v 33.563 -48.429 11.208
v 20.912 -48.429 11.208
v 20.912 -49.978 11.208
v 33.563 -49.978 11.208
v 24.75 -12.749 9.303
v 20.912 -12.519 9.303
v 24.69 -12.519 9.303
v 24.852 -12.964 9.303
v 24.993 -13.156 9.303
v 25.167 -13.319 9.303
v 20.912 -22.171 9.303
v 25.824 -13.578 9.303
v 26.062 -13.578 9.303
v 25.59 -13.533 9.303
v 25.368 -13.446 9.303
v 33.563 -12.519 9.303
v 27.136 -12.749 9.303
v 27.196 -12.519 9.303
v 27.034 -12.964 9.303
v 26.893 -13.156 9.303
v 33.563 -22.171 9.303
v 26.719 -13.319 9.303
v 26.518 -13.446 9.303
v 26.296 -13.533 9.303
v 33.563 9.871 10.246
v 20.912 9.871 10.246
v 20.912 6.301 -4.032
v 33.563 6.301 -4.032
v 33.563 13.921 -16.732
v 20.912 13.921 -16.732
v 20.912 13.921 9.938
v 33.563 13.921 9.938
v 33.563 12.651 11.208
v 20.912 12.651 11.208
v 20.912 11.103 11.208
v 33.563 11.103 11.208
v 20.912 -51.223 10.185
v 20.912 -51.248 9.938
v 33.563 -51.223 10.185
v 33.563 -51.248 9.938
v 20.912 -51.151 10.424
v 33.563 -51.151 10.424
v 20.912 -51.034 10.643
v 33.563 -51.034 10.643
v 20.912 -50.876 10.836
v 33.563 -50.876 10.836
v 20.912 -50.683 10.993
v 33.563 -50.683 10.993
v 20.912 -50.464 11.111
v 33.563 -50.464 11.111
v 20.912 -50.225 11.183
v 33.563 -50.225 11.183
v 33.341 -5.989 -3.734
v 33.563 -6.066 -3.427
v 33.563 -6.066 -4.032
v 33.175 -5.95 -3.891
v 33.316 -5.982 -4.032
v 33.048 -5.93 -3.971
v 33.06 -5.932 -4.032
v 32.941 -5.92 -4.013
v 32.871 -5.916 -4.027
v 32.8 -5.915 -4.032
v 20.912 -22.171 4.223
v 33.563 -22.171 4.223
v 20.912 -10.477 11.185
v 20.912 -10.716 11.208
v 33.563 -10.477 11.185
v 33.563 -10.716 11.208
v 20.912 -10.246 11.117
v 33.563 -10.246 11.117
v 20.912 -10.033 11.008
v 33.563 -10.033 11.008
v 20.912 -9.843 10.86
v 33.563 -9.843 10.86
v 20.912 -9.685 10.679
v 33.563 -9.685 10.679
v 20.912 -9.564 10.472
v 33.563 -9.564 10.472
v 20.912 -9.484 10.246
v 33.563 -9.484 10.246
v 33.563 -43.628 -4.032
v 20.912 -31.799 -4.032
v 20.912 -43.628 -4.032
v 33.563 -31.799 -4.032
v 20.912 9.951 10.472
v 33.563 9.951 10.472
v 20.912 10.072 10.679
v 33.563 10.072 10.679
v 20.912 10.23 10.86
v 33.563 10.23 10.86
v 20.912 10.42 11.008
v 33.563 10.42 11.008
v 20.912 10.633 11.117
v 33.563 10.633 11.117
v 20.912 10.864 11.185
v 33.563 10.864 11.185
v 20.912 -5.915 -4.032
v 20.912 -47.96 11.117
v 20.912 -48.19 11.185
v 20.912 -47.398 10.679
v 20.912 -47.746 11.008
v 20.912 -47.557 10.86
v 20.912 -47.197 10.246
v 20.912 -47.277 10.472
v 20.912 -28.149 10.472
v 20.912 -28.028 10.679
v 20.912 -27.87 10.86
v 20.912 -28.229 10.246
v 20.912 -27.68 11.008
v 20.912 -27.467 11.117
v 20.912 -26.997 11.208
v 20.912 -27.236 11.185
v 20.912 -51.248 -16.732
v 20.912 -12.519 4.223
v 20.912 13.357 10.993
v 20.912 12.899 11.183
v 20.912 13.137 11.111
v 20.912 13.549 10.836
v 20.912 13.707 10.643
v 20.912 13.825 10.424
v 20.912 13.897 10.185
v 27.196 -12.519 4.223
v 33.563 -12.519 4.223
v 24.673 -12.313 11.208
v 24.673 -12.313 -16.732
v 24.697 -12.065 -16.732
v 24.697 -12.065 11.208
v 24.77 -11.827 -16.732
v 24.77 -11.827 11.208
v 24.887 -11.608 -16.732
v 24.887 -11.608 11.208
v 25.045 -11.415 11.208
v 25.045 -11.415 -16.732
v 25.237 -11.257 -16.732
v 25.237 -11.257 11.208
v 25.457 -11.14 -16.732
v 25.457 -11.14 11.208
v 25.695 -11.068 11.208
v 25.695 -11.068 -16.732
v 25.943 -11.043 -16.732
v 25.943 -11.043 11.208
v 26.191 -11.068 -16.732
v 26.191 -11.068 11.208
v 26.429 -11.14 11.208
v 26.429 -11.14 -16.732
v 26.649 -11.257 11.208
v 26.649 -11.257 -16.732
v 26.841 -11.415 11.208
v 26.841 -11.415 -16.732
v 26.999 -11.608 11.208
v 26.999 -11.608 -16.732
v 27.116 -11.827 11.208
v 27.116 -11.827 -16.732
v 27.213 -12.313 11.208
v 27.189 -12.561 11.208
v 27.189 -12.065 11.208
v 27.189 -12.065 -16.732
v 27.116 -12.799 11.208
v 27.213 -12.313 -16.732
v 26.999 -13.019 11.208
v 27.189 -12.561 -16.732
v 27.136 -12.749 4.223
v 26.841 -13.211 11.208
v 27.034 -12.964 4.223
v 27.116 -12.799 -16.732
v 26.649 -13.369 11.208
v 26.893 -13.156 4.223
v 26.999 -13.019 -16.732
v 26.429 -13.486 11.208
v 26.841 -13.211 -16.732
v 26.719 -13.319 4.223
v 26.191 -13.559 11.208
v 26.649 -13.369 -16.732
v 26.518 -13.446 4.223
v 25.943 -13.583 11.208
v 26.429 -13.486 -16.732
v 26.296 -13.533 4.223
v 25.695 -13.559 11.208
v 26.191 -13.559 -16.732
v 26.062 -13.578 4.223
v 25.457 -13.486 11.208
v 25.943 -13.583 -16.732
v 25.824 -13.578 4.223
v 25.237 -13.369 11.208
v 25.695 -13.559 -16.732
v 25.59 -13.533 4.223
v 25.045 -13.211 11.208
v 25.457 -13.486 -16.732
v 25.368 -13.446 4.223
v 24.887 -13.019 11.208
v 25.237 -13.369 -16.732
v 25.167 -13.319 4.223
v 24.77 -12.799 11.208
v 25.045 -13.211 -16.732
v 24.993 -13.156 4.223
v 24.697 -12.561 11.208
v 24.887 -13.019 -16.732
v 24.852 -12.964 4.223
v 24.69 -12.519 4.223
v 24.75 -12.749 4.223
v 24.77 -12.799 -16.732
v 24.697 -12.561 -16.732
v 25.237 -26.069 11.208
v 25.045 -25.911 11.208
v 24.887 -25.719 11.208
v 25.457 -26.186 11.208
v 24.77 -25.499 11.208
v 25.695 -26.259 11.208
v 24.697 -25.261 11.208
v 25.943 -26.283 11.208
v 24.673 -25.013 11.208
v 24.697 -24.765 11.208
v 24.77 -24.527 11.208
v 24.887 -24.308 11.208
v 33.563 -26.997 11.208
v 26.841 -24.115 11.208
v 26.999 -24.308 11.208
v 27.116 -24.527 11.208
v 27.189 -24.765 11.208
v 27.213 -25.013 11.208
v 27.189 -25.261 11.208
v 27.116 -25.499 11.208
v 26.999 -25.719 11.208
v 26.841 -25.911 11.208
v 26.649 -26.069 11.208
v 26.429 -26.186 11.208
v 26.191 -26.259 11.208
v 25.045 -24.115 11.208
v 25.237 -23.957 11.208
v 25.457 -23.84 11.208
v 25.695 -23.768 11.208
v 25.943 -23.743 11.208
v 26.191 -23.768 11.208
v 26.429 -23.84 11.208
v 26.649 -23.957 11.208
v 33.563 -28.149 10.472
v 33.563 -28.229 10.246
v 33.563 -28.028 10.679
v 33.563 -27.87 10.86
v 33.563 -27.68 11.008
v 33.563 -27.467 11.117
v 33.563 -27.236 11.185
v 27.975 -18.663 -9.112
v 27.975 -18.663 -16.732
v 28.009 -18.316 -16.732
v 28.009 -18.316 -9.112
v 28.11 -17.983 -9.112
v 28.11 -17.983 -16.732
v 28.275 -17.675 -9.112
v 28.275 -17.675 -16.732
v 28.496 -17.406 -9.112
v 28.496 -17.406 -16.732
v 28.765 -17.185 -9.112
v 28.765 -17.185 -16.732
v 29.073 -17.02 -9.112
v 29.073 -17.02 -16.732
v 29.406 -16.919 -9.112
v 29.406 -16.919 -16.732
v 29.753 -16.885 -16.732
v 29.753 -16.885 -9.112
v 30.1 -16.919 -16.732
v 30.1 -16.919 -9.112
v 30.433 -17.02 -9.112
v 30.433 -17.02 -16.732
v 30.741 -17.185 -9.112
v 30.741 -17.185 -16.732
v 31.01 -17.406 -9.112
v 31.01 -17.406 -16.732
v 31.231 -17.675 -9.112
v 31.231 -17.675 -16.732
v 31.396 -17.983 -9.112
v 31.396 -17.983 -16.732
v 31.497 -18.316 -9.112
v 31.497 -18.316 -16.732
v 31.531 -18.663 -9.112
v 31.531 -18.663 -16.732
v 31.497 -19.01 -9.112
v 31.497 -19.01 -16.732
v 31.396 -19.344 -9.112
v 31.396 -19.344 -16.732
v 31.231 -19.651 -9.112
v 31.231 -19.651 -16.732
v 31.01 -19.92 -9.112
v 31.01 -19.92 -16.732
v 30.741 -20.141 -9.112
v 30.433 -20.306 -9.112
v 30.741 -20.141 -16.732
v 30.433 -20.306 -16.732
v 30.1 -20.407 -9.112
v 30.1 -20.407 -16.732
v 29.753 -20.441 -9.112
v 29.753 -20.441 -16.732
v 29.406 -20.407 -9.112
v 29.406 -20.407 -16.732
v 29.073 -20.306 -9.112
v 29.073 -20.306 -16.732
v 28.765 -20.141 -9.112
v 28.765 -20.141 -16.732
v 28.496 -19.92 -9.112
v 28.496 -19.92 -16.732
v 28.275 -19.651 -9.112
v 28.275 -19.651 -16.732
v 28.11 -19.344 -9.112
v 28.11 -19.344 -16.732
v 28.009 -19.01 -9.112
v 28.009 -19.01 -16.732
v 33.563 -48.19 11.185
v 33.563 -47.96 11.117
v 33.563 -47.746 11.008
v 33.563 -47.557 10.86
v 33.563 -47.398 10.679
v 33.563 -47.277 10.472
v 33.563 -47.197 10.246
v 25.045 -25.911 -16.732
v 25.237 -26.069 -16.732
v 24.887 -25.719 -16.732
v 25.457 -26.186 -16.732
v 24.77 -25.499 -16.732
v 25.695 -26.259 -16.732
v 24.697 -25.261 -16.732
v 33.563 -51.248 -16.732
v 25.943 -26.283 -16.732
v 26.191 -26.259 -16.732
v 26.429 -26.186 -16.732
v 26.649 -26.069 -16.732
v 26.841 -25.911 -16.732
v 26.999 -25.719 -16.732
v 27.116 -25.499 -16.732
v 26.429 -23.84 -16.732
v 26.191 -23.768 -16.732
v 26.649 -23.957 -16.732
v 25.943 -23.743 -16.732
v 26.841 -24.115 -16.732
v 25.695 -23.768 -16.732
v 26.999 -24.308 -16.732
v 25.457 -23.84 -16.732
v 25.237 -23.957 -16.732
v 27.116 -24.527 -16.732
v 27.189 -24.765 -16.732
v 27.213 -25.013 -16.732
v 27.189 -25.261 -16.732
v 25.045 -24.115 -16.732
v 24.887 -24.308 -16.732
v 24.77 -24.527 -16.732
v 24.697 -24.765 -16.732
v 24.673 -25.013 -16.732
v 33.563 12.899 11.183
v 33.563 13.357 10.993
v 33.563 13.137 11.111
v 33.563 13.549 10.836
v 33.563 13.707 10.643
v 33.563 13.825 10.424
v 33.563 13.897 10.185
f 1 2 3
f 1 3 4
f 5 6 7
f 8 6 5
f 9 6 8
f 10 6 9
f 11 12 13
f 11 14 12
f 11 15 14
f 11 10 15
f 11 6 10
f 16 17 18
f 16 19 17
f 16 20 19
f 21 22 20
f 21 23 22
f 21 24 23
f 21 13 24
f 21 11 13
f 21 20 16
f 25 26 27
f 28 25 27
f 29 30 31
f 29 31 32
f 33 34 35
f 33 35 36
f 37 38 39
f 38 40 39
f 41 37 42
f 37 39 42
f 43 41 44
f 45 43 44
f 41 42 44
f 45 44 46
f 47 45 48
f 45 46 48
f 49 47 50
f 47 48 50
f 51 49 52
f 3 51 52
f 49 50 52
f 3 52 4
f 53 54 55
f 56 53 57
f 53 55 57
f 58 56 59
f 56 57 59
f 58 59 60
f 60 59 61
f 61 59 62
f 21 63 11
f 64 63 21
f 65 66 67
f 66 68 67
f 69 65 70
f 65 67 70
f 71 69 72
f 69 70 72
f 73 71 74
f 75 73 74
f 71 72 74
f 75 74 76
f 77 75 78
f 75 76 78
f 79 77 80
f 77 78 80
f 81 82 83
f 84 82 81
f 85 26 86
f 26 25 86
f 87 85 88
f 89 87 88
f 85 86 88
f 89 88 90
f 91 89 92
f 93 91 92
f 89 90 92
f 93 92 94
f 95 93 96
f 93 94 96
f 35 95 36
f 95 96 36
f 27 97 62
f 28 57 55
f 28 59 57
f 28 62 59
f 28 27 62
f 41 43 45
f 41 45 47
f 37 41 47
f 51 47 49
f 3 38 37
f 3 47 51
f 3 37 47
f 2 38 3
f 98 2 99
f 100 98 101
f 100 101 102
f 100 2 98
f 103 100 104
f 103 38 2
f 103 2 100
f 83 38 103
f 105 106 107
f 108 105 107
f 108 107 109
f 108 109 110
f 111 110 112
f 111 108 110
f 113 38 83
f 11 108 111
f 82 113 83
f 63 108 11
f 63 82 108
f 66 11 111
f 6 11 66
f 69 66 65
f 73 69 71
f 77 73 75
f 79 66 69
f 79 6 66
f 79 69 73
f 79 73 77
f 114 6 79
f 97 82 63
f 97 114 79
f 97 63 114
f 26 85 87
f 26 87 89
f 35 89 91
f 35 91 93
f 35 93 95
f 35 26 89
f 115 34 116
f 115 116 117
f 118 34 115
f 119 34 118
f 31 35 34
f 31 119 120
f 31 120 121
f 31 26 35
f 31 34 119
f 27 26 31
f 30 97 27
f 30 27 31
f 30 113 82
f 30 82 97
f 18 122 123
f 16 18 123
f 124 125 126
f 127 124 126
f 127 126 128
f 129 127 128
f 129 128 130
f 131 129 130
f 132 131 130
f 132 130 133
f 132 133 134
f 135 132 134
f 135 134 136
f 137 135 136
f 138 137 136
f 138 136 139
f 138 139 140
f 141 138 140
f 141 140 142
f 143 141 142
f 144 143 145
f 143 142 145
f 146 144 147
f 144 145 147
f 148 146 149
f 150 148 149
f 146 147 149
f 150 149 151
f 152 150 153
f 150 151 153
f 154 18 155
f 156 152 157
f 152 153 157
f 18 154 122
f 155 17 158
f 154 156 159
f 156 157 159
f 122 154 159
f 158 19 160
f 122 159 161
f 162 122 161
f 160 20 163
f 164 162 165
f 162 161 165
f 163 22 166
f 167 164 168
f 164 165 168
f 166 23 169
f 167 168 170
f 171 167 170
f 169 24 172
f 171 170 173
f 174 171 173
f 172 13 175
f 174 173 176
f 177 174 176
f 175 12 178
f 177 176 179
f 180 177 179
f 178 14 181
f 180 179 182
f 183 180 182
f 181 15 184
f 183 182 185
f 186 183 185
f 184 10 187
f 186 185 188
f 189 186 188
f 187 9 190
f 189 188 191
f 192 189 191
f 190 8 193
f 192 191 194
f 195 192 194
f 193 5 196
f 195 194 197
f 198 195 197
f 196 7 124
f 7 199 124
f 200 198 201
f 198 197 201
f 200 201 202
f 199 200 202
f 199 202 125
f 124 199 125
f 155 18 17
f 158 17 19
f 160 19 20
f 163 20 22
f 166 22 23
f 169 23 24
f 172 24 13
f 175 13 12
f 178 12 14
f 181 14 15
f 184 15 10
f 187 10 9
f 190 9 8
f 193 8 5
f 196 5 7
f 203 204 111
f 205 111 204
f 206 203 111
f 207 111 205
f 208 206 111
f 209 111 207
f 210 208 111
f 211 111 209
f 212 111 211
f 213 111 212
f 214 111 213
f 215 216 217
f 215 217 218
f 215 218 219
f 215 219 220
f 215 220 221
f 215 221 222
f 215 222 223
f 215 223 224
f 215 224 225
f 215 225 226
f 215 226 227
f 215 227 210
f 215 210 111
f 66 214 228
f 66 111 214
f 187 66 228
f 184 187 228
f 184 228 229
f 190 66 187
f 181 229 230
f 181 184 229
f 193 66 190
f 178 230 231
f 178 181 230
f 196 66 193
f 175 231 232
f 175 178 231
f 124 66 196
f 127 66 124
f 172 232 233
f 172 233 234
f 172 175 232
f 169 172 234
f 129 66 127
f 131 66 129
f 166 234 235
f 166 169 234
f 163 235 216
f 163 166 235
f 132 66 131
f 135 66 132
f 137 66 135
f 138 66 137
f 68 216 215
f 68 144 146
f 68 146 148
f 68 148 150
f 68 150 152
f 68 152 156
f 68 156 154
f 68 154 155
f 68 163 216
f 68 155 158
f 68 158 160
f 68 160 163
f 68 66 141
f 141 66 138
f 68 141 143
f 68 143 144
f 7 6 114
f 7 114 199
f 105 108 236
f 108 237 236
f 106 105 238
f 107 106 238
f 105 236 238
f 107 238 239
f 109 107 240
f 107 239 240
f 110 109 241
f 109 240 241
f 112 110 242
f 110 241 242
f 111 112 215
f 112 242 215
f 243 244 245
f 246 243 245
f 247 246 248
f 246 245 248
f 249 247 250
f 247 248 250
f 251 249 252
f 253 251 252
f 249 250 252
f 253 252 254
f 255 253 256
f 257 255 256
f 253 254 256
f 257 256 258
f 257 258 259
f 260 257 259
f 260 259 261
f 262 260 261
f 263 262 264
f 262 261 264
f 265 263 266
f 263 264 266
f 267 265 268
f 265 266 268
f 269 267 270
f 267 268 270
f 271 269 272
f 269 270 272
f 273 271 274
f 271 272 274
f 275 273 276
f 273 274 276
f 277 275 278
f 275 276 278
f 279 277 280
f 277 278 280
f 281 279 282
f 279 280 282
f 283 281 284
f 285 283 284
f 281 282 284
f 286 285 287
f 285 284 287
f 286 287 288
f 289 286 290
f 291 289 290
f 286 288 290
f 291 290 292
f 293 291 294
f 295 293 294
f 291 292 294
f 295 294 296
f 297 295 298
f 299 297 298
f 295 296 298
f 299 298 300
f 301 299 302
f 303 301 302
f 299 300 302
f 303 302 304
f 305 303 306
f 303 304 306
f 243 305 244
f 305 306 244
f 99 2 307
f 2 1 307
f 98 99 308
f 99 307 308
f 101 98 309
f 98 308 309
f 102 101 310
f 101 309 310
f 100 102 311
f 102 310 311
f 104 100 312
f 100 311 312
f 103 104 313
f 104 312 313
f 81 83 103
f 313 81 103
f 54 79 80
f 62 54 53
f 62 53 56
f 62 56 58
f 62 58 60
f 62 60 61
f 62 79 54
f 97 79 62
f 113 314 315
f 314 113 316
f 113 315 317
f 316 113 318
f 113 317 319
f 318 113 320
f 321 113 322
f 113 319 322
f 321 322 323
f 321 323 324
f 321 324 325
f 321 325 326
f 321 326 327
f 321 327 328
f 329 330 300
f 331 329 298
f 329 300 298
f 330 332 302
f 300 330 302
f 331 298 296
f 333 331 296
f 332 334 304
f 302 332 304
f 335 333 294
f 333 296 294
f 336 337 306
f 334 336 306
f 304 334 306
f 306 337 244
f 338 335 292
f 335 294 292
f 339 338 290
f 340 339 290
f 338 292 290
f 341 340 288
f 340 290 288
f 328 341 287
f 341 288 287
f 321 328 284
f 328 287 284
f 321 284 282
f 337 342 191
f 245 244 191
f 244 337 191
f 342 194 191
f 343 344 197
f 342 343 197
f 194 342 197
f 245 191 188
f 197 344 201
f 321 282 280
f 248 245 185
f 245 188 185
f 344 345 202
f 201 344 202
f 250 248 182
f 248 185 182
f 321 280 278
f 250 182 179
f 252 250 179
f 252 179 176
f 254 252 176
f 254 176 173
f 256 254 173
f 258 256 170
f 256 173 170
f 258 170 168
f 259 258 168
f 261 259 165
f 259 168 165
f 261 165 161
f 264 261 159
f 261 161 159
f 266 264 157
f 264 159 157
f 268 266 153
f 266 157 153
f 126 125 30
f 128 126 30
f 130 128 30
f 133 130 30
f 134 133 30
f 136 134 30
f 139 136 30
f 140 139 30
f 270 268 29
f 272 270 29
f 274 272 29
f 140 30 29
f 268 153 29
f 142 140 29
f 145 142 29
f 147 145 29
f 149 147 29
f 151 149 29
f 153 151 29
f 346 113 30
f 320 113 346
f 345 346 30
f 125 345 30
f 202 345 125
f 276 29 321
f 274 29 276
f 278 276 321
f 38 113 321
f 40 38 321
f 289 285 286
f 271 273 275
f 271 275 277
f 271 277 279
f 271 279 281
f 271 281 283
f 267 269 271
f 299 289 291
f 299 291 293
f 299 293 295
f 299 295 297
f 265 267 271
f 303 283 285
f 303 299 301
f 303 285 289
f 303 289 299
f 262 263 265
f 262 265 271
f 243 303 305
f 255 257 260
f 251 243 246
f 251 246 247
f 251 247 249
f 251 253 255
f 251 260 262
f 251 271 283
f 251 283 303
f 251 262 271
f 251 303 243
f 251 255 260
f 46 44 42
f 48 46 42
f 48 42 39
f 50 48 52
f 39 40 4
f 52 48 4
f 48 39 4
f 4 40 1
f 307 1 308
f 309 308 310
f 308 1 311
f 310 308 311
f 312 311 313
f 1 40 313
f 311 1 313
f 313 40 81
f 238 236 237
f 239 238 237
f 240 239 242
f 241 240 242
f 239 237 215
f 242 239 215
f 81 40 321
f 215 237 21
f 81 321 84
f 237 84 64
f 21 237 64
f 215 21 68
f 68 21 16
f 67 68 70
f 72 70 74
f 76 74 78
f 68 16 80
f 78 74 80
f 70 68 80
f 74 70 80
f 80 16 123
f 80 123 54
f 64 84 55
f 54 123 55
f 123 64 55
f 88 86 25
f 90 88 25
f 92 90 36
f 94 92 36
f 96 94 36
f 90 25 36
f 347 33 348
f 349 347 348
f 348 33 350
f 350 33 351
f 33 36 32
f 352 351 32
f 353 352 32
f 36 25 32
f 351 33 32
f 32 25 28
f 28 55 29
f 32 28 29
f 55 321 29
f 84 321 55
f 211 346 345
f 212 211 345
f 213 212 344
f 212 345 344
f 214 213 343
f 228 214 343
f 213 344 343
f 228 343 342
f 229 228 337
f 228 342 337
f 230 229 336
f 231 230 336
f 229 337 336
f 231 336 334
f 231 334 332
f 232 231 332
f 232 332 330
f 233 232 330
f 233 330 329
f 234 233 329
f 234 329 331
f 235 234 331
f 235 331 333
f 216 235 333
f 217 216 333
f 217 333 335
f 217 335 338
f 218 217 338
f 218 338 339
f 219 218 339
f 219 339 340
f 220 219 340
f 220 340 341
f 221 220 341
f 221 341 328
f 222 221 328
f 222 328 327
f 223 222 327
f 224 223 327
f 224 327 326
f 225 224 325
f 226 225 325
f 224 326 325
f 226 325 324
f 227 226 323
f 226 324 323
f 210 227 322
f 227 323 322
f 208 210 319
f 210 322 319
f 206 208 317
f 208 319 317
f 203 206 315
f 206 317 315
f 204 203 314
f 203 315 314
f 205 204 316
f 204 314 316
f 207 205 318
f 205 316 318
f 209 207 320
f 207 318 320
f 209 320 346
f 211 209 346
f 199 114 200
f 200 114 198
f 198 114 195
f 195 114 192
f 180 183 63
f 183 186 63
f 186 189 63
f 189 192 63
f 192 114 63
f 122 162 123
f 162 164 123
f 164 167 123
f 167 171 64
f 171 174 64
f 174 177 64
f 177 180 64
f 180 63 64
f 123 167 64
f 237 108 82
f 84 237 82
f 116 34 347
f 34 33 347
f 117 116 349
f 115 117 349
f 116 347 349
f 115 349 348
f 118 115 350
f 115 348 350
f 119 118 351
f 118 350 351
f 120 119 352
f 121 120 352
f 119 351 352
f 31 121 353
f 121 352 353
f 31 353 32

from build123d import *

# Parameters (mm, degrees)
BOSS_EXTRUDE1_START     = -4.032483
SKETCH2_W               = 12.650748945
SKETCH2_H               = 65.169112304
BOSS_EXTRUDE1_DEPTH     = 12.7
BOSS_EXTRUDE3_START     = -4.032483117
BOSS_EXTRUDE3_OUTLINE_W = 12.650748945
BOSS_EXTRUDE3_OUTLINE_H = 7.62
BOSS_EXTRUDE3_DEPTH     = 15.24
SKETCH3_R               = 1.778
CUT_EXTRUDE1_DEPTH      = 7.62
SKETCH3_3_R             = 1.27
CUT_EXTRUDE2_DEPTH      = 68.330862042
CUT_EXTRUDE6_DEPTH      = 56.374578465
FILLET1_R               = 1.27
CAVITY1_START           = -22.170556152
CAVITY1_OUTLINE_W       = 12.650748945
CAVITY1_OUTLINE_H       = 5.08
CAVITY1_DEPTH           = 9.652


# Read off the part's stored shape, not the designer's step: Boss-Extrude3, Cavity1
with BuildPart() as part:
    # Sketch2 → Boss-Extrude1 (new body)
    with BuildSketch(Plane.XY.offset(BOSS_EXTRUDE1_START)):
        with Locations((27.23762425, -18.663141358)):
            Rectangle(SKETCH2_W, SKETCH2_H)
    extrude(amount=-BOSS_EXTRUDE1_DEPTH)

    # Boss-Extrude3 outline → Boss-Extrude3 (add)
    with BuildSketch(Plane.XY.offset(BOSS_EXTRUDE3_START)):
        with Locations((27.23762425, 10.111414794)):
            Rectangle(BOSS_EXTRUDE3_OUTLINE_W, BOSS_EXTRUDE3_OUTLINE_H)
        with BuildLine():
            Line((32.8, -5.914556152), (20.912249778, -5.914556152))
            Line((20.912249778, -5.914556152), (20.912249778, -31.798585206))
            Line((20.912249778, -31.798585206), (33.562998723, -31.798585206))
            Line((33.562998723, -31.798585206), (33.562998723, -6.065817947))
            ThreePointArc((33.562998723, -6.065817947), (33.188923894, -5.952736026), (32.8, -5.914556152))
        make_face()
        with Locations((27.23762425, -47.43769751)):
            Rectangle(BOSS_EXTRUDE3_OUTLINE_W, BOSS_EXTRUDE3_OUTLINE_H)
    extrude(amount=BOSS_EXTRUDE3_DEPTH)

    # Sketch3 → Cut-Extrude1 (cut)
    with BuildSketch(Plane(origin=(0, 0, -16.732483117), x_dir=(-1, 0, 0), z_dir=(0, 0, -1))):
        with Locations((-29.752998723, -18.663141358)):
            Circle(SKETCH3_R)
    extrude(amount=-CUT_EXTRUDE1_DEPTH, mode=Mode.SUBTRACT)

    # Sketch3<3> → Cut-Extrude2 (cut, through all)
    with BuildSketch(Plane(origin=(0, 0, -16.732483117), x_dir=(-1, 0, 0), z_dir=(0, 0, -1))):
        with Locations((-25.942998723, -12.313141358)):
            Circle(SKETCH3_3_R)
        with Locations((-25.942998723, -25.013141358)):
            Circle(SKETCH3_3_R)
    extrude(amount=-CUT_EXTRUDE2_DEPTH, mode=Mode.SUBTRACT)

    # Sketch7 → Cut-Extrude6 (cut, through all)
    with BuildSketch(Plane.ZY.offset(-20.912249778)):
        Polygon((11.207516883, 6.301414794), (11.207516883, 10.111414794), (-4.032483117, 6.301414794), align=None)
        Polygon((-4.032483117, -5.914556152), (11.207516883, -5.914556152), (11.207516883, -9.724556152), align=None)
        Polygon((-4.032483117, -43.62769751), (11.207516883, -47.43769751), (11.207516883, -43.62769751), align=None)
        Polygon((11.207516883, -31.798585206), (11.207516883, -27.988585206), (-4.032483117, -31.798585206), align=None)
    extrude(amount=-CUT_EXTRUDE6_DEPTH, mode=Mode.SUBTRACT)

    # Fillet1
    fillet1_edges = [part.edges().sort_by_distance(p)[0] for p in [
        (27.237624251, -9.724556152, 11.207516883),
        (27.23762425, -51.24769751, 11.207516883),
        (27.23762425, 13.921414794, 11.207516883),
        (27.237624251, 10.111414794, 11.207516883),
        (27.237624251, -27.988585206, 11.207516883),
        (27.237624251, -47.43769751, 11.207516883),
    ]]
    fillet(fillet1_edges, radius=FILLET1_R)

    # Cavity1 outline → Cavity1 (cut)
    with BuildSketch(Plane(origin=(0, 0, 0), x_dir=(1, 0, 0), z_dir=(0, 1, 0)).offset(CAVITY1_START)):
        with Locations((27.23762425, -6.762516883)):
            Rectangle(CAVITY1_OUTLINE_W, CAVITY1_OUTLINE_H)
    extrude(amount=CAVITY1_DEPTH, mode=Mode.SUBTRACT)


solid = part.part
